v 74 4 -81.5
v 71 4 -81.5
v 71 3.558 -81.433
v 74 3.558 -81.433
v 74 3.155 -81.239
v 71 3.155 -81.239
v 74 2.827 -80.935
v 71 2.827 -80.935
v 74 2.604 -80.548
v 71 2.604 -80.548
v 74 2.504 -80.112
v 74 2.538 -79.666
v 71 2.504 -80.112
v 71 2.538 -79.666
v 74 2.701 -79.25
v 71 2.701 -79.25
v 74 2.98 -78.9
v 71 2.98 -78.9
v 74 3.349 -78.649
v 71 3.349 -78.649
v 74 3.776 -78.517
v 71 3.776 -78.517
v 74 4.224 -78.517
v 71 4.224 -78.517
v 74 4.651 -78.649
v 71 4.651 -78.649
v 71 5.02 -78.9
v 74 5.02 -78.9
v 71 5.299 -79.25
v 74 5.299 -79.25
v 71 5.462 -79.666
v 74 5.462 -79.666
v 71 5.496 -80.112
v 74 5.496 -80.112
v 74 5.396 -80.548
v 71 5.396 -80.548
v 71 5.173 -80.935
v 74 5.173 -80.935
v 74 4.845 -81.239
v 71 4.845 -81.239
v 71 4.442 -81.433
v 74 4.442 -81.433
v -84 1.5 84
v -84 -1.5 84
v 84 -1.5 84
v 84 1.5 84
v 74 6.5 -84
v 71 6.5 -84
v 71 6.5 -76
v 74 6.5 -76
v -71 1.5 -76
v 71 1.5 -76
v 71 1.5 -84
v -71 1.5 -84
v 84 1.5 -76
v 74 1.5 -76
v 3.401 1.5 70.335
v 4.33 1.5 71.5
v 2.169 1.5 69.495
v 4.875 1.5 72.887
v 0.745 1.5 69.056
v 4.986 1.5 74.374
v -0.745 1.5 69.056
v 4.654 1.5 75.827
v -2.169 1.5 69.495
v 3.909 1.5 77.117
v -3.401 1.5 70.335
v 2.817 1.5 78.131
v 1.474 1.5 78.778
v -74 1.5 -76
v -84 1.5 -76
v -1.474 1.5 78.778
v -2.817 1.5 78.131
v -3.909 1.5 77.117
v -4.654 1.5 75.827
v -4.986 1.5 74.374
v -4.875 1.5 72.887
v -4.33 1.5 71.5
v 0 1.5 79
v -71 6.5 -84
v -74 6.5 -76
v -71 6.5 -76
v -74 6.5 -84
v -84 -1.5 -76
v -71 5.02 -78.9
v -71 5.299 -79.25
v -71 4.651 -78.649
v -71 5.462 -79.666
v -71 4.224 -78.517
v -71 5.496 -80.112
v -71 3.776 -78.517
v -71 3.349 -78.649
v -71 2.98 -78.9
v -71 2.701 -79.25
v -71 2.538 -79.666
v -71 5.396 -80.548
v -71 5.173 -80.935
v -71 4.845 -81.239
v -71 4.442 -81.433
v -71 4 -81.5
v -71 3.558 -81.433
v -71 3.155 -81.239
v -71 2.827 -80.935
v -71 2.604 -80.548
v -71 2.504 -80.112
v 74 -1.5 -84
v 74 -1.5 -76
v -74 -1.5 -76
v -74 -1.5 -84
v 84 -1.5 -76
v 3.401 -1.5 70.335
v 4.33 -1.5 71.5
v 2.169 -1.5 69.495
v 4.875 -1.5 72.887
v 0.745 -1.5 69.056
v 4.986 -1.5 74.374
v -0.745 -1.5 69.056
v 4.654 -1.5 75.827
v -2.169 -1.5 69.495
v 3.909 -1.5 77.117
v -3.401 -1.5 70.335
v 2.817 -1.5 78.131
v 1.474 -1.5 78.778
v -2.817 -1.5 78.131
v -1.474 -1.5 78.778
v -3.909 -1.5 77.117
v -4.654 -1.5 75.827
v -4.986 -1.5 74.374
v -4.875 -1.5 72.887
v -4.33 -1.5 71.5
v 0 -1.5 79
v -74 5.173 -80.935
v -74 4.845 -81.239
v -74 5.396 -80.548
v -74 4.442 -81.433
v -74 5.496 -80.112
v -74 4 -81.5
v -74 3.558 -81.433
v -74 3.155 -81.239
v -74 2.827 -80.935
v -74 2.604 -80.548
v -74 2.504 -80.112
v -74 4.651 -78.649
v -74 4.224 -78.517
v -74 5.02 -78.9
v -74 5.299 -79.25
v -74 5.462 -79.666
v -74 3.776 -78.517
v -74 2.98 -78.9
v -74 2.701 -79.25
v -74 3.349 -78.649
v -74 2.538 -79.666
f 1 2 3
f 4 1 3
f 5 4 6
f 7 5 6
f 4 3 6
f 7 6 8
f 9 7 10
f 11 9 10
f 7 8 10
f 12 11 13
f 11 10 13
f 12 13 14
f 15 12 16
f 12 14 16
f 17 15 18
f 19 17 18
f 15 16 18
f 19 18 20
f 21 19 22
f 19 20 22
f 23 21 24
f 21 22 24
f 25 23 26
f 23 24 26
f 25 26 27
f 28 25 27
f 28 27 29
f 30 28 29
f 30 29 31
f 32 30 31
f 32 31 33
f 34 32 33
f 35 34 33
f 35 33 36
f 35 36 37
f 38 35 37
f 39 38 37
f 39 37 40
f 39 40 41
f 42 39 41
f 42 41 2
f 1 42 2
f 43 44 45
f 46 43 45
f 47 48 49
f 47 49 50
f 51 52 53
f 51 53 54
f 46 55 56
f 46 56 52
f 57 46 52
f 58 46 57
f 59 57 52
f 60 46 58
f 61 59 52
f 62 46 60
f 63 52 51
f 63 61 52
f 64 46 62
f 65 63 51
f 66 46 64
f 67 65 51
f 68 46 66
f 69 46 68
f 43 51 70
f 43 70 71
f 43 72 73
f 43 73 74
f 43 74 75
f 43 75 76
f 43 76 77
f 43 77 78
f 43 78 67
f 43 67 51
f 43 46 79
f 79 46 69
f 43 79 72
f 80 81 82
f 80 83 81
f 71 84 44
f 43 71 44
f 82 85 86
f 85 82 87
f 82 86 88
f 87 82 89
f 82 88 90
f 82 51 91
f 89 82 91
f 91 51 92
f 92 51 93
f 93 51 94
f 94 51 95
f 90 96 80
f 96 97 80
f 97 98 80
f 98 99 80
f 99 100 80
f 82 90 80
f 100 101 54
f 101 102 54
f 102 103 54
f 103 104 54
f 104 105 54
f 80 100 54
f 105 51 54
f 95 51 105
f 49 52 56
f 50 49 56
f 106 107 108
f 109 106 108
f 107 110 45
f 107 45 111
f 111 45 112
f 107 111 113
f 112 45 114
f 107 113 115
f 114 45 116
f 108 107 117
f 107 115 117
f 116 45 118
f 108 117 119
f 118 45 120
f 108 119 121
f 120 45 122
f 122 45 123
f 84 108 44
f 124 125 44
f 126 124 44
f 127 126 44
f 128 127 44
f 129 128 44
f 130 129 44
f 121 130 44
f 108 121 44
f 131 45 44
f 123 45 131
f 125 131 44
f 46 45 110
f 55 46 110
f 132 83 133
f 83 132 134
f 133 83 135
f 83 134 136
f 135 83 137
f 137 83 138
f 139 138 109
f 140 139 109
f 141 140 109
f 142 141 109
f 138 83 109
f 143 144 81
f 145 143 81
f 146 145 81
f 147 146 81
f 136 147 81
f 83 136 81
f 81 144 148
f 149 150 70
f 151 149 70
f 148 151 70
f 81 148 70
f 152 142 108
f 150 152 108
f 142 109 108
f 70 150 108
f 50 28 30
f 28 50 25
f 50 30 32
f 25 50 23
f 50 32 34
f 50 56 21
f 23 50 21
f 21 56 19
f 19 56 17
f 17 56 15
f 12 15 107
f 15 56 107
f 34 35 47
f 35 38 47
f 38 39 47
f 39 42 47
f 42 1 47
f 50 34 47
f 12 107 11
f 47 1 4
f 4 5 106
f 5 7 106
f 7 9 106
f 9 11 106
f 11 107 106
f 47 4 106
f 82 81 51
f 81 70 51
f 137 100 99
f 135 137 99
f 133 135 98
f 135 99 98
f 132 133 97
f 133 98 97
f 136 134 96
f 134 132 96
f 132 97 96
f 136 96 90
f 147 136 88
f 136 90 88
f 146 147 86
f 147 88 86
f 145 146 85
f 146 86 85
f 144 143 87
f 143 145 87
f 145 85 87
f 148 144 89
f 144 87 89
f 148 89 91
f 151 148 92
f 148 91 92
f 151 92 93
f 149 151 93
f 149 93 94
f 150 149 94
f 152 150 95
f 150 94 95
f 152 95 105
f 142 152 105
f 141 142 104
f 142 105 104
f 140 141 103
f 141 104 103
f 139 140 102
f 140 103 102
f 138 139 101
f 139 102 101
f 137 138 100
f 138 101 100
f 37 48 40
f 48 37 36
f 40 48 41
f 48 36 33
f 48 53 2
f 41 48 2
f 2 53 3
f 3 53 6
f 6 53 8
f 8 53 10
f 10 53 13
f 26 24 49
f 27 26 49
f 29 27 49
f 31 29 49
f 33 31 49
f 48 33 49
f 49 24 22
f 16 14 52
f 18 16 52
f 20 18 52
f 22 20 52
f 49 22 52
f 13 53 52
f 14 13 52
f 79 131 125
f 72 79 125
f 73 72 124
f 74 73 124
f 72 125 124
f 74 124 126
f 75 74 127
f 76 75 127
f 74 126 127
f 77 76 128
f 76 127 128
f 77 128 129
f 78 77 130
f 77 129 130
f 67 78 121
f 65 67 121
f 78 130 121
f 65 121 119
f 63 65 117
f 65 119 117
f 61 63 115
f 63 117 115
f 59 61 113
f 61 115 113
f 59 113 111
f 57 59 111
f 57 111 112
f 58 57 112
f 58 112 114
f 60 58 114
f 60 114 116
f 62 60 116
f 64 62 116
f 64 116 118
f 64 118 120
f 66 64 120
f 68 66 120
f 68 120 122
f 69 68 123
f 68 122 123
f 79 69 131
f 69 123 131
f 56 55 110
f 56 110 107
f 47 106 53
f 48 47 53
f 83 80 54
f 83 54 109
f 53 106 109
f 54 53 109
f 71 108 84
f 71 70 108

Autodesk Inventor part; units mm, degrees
ref_plane "YZ Plane" through (0, 0, 0) normal (1, 0, 0) x (0, 1, 0)
ref_plane "XZ Plane" through (0, 0, 0) normal (0, 1, 0) x (-1, 0, 0)
ref_plane "XY Plane" through (0, 0, 0) normal (0, 0, 1) x (1, 0, 0)
sketch "Náčrt1" plane through (0, 0, 0) normal (0, 1, 0) x (-1, 0, 0)
  line L0 (84, 84) -> (-84, 84)
  line L1 (-84, 84) -> (-84, -84)
  line L2 (-84, -84) -> (84, -84)
  line L3 (84, -84) -> (84, 84)
  line L4 (0, -117.6) -> (0, 117.6) projected
  line L5 (-117.6, 0) -> (117.6, 0) projected
  point P0 (0, 0)
  dimension "d0" = 168
  dimension "d1" = 168
extrude "Vysunutí1" add sketch "Náčrt1" along normal mid plane 3
sketch "Náčrt2" plane through (0, 1.5, 0) normal (0, 1, 0) x (1, 0, 0)
  line L0 (-84, -84) -> (84, -84) projected
  line L1 (84, -84) -> (84, 84) projected
  point P0 (0, 0)
  point P1 (0, -74)
  dimension "d13" = 10
  dimension "d14" = 84
sketch "Náčrt3" plane through (0, 1.5, 0) normal (0, 1, 0) x (1, 0, 0)
  line L0 (74, 84) -> (84, 84)
  line L1 (84, 84) -> (84, 76)
  line L2 (84, 76) -> (74, 76)
  line L3 (74, 76) -> (74, 84)
  line L4 (84, 84) -> (-84, 84) projected
  line L5 (84, -84) -> (84, 84) projected
  point P0 (0, 0)
  dimension "d9" = 10
  dimension "d10" = 8
extrude "Vysunutí3" cut sketch "Náčrt3" against normal through all
mirror "Zrcadlit1" about plane through (0, 0, 0) normal (1, 0, 0) of "Vysunutí3"
hole "Díra1" at (0, 1.5, 74) direction (0, -1, 0) diameter 10 end through all
sketch "Náčrt4" plane through (0, 1.5, 0) normal (0, 1, 0) x (1, 0, 0)
  line L0 (71, 76) -> (74, 76)
  line L1 (74, 76) -> (74, 84)
  line L2 (74, 84) -> (71, 84)
  line L3 (71, 84) -> (71, 76)
  line L4 (74, 76) -> (74, 84) projected
  line L5 (74, 84) -> (-74, 84) projected
  point P0 (0, 0)
  dimension "d22" = 3
extrude "Vysunutí4" add sketch "Náčrt4" along normal blind 5
sketch "Náčrt5" plane through (74, -1.5, -76) normal (1, 0, 0) x (0, 0, -1)
  line L0 (0, 8) -> (8, 8) projected
  line L1 (0, 3) -> (0, 8) projected
  line L2 (8, 8) -> (8, 0) projected
  point P0 (-76, 1.5)
  point P1 (4, 5.5)
  dimension "d25" = 2.5
  dimension "d34" = 4
hole "Díra2" at (74, 4, -80) direction (-1, 0, 0) diameter 3 depth 3
mirror "Zrcadlit2" about plane through (0, 0, 0) normal (1, 0, 0) of "Vysunutí4", "Díra2"
properties part number "Cabinet - door"
